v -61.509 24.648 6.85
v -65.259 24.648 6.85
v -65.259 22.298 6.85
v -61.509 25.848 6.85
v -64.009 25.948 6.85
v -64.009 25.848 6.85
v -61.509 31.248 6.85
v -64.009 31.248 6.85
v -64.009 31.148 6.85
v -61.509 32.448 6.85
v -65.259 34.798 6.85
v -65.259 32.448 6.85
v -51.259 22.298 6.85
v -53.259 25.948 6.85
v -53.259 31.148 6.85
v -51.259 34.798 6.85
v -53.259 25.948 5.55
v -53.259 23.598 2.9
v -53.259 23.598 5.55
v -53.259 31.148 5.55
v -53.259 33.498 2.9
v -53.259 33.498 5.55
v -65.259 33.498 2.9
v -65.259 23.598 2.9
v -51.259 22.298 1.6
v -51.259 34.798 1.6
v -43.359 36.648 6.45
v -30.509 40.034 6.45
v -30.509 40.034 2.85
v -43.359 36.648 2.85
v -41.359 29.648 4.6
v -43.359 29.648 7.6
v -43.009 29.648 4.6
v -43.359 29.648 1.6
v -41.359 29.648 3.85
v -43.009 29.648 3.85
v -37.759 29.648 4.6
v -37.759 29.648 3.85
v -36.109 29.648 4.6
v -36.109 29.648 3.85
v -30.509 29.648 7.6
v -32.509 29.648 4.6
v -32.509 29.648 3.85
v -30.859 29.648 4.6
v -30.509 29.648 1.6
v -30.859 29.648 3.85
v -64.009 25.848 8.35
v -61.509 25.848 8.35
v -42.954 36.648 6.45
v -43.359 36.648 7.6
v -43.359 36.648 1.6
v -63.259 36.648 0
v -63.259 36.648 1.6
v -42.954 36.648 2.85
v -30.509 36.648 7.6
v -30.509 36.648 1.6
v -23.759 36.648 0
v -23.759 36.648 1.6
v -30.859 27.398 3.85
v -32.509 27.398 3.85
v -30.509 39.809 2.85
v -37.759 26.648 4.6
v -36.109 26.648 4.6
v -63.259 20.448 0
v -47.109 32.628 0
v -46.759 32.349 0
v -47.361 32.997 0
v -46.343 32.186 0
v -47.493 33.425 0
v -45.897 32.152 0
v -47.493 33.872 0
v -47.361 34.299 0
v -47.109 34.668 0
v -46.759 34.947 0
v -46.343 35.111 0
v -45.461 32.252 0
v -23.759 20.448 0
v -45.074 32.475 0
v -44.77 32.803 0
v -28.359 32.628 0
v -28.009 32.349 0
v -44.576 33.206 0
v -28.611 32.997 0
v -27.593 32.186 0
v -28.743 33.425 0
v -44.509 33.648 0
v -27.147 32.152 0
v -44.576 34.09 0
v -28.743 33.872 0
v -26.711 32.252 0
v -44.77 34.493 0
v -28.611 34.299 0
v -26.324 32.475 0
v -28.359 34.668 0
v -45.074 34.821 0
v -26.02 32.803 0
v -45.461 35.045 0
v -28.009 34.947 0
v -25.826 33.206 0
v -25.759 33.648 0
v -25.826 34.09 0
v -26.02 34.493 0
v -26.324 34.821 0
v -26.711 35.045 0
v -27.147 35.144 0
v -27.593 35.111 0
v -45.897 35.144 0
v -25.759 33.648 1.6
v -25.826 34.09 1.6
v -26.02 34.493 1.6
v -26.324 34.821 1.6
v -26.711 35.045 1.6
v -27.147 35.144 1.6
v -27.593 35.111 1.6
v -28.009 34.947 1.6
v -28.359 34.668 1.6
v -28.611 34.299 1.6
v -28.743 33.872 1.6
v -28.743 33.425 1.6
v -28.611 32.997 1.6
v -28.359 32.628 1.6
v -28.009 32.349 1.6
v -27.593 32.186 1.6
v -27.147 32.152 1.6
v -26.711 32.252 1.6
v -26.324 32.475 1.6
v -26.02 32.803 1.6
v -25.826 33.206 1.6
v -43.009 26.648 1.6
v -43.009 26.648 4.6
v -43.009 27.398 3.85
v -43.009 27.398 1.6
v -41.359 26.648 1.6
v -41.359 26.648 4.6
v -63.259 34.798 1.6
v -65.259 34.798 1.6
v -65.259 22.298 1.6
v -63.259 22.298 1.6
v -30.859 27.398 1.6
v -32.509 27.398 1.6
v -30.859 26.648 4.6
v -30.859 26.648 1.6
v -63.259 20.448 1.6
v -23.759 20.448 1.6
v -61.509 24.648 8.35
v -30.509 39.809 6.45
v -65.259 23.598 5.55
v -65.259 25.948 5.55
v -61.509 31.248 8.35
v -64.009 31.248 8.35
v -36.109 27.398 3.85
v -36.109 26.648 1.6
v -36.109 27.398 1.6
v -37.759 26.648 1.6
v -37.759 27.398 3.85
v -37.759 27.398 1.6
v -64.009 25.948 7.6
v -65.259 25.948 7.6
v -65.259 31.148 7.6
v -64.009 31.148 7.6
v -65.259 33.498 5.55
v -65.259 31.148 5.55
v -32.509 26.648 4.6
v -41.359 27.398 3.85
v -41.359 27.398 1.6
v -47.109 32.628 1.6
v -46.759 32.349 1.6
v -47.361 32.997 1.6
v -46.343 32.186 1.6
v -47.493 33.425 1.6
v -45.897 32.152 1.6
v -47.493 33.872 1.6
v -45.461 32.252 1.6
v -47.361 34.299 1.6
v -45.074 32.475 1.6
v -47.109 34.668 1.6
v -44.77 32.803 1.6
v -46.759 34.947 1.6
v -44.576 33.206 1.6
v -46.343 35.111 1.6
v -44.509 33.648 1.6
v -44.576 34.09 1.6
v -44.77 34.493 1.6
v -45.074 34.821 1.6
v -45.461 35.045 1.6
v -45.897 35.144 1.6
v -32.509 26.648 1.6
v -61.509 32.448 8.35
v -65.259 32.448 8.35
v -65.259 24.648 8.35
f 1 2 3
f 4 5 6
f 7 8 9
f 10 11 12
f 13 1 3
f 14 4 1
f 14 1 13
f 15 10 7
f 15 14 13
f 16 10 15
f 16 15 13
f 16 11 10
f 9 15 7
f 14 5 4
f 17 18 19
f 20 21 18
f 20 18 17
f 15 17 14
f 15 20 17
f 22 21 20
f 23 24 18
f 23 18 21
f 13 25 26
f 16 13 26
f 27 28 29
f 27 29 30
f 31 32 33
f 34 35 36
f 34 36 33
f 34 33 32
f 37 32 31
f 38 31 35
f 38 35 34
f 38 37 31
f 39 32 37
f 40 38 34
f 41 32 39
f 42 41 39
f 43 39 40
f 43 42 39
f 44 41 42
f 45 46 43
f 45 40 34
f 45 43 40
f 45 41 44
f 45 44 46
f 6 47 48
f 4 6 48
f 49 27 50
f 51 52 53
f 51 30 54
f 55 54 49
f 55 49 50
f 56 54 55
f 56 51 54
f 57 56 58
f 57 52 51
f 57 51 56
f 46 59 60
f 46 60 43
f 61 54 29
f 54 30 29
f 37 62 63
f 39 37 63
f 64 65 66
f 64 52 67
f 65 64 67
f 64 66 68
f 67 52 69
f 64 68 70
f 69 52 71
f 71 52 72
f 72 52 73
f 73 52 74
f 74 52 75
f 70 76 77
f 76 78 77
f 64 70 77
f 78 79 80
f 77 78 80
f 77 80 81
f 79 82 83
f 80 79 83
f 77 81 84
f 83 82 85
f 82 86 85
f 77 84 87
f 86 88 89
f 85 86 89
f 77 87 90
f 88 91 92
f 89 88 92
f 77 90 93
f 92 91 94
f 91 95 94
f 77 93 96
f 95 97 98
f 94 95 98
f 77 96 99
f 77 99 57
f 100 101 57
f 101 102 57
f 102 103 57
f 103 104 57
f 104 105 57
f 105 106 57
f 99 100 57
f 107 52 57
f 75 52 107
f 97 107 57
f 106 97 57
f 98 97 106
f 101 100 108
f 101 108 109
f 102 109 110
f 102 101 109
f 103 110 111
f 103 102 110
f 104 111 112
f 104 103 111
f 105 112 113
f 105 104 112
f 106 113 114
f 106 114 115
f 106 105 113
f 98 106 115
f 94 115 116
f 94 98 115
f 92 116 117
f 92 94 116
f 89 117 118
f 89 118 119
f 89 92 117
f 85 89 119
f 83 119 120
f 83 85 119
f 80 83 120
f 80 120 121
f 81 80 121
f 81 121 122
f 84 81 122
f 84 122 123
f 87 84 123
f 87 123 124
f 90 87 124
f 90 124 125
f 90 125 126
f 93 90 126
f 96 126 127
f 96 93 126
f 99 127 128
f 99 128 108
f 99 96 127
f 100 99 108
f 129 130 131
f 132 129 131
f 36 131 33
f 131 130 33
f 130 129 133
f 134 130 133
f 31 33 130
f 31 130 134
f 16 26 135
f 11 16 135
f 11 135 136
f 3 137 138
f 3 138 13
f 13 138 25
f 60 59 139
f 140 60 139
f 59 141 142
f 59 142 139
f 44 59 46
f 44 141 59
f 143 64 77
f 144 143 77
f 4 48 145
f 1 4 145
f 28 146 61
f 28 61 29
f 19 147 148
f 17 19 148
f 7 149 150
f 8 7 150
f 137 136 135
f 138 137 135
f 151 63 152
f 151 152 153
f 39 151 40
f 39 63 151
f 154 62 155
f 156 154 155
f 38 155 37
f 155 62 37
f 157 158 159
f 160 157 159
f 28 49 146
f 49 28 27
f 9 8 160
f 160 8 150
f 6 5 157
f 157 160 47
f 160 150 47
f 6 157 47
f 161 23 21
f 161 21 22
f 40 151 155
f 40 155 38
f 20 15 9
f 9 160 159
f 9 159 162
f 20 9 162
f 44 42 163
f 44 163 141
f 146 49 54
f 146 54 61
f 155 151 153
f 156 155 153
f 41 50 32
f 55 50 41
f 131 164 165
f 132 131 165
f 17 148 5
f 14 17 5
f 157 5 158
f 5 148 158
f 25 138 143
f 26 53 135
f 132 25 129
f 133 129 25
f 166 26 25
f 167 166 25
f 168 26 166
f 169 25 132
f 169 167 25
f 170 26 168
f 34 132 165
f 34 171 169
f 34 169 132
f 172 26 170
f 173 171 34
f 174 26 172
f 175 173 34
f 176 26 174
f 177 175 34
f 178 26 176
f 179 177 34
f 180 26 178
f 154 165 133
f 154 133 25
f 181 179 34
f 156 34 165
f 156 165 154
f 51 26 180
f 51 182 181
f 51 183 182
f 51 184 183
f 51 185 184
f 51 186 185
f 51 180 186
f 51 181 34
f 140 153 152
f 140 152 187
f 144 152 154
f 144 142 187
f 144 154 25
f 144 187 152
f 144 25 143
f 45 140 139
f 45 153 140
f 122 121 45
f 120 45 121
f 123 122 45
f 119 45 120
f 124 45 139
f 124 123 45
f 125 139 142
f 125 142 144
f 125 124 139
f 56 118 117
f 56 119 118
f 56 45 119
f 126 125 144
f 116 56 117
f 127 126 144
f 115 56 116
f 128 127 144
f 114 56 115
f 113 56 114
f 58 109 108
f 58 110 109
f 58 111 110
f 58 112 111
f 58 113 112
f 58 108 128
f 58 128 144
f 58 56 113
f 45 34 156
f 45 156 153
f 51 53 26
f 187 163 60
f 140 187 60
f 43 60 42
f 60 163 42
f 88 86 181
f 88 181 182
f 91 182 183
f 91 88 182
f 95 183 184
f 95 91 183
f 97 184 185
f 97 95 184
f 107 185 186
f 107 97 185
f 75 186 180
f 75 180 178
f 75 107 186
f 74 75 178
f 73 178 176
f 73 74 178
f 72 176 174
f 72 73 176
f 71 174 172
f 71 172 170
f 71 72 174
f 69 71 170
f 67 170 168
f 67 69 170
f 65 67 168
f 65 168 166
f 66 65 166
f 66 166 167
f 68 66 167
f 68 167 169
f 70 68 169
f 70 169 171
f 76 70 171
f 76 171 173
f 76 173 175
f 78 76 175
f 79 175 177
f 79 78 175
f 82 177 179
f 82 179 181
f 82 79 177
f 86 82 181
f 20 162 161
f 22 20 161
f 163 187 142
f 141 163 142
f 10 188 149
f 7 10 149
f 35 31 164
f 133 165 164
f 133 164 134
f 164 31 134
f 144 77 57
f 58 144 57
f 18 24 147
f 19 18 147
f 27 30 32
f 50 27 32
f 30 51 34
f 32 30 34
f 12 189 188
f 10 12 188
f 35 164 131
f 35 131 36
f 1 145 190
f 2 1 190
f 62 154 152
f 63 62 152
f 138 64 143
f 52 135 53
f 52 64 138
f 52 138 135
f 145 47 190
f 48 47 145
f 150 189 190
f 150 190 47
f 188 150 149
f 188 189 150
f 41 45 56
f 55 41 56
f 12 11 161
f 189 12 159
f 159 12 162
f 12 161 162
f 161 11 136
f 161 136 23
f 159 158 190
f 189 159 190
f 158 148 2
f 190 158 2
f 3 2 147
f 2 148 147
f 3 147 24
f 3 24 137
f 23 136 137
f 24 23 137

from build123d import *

# Parameters (mm, degrees)
SKETCH1_W           = 39.5
SKETCH1_H           = 16.2
SKETCH1_R           = 1.5
BOSS_EXTRUDE1_DEPTH = 1.6
BOSS_EXTRUDE2_DEPTH = 6
SKETCH3_W           = 12.85
SKETCH3_H           = 3
CUT_EXTRUDE1_DEPTH  = 3
CUT_EXTRUDE3_DEPTH  = 3
SKETCH5_W           = 2.25
SKETCH5_H           = 2.25
CUT_EXTRUDE4_DEPTH  = 50.733422671
BOSS_EXTRUDE3_DEPTH = 6.75
CUT_EXTRUDE5_DEPTH  = 1.5
SKETCH8_W           = 2.65
SKETCH8_H           = 9.9
CUT_EXTRUDE6_DEPTH  = 12
CUT_EXTRUDE7_REACH  = 76.987
SKETCH9_W           = 0.35
SKETCH9_H           = 3
SKETCH9_W_2         = 0.175
BOSS_EXTRUDE4_DEPTH = 4.75
SKETCH11_W          = 12.85
SKETCH11_H          = 1.15
CUT_EXTRUDE8_DEPTH  = 4.75


with BuildPart() as part:
    # Sketch1 → Boss-Extrude1 (new body)
    with BuildSketch(Plane.XY):
        with Locations((-43.509331094, 28.548203647)):
            Rectangle(SKETCH1_W, SKETCH1_H)
        with Locations((-27.259331094, 33.648203647)):
            Circle(SKETCH1_R, mode=Mode.SUBTRACT)
        with Locations((-46.009331094, 33.648203647)):
            Circle(SKETCH1_R, mode=Mode.SUBTRACT)
    extrude(amount=BOSS_EXTRUDE1_DEPTH)

    # Sketch2 → Boss-Extrude2 (add)
    with BuildSketch(Plane.XY.offset(1.6)):
        Polygon((-30.509331094, 30.378901516), (-30.509331094, 36.648203647), (-43.359331094, 36.648203647), (-43.359331094, 26.648203647), (-30.509331094, 26.648203647), align=None)
    extrude(amount=BOSS_EXTRUDE2_DEPTH)

    # Sketch3 → Cut-Extrude1 (cut)
    with BuildSketch(Plane.XY.offset(7.6)):
        with Locations((-36.934331094, 28.148203647)):
            Rectangle(SKETCH3_W, SKETCH3_H)
    extrude(amount=-CUT_EXTRUDE1_DEPTH, mode=Mode.SUBTRACT)

    # Sketch4 → Cut-Extrude3 (cut)
    with BuildSketch(Plane.XY.offset(4.6)):
        Polygon((-32.509331094, 29.648203647), (-35.934331094, 29.648203647), (-35.934331094, 26.648203647), (-32.509331094, 26.648203647), (-32.509331094, 27.856511678), align=None)
        Polygon((-37.934331094, 29.648203647), (-41.359331094, 29.648203647), (-41.359331094, 28.148203647), (-41.359331094, 26.648203647), (-37.934331094, 26.648203647), align=None)
    extrude(amount=-CUT_EXTRUDE3_DEPTH, mode=Mode.SUBTRACT)

    # Sketch5 → Cut-Extrude4 (cut, through all)
    with BuildSketch(Plane(origin=(-30.509331094, 0, 0), x_dir=(0, 0, -1), z_dir=(1, 0, 0))):
        with Locations((-2.725, 28.523203647)):
            Rectangle(SKETCH5_W, SKETCH5_H)
    extrude(amount=-CUT_EXTRUDE4_DEPTH, mode=Mode.SUBTRACT)

    # Sketch6 → Boss-Extrude3 (add)
    with BuildSketch(Plane.XY.offset(1.6)):
        Polygon((-63.259331094, 22.298203647), (-63.259331094, 28.548203647), (-63.259331094, 34.798203647), (-65.259331094, 34.798203647), (-65.259331094, 22.298203647), align=None)
        Polygon((-63.259331094, 34.798203647), (-63.259331094, 28.548203647), (-63.259331094, 22.298203647), (-51.259331094, 22.298203647), (-51.259331094, 34.798203647), align=None)
    extrude(amount=BOSS_EXTRUDE3_DEPTH)

    # Sketch7 → Cut-Extrude5 (cut)
    with BuildSketch(Plane.XY.offset(8.35)):
        Polygon((-65.259331094, 34.798203647), (-65.259331094, 32.448203647), (-61.509331094, 32.448203647), (-61.509331094, 31.248203647), (-64.009331094, 31.248203647), (-64.009331094, 25.848203647), (-61.509331094, 25.848203647), (-61.509331094, 24.648203647), (-65.259331094, 24.648203647), (-65.259331094, 22.298203647), (-51.259331094, 22.298203647), (-51.259331094, 34.798203647), align=None)
    extrude(amount=-CUT_EXTRUDE5_DEPTH, mode=Mode.SUBTRACT)

    # Sketch8 → Cut-Extrude6 (cut)
    with BuildSketch(Plane.ZY.offset(65.259331094)):
        Polygon((6.85, 31.148203647), (5.55, 31.148203647), (5.55, 25.948203647), (6.85, 25.948203647), (7.6, 25.948203647), (7.6, 31.148203647), align=None)
        with Locations((4.225, 28.548203647)):
            Rectangle(SKETCH8_W, SKETCH8_H)
    extrude(amount=-CUT_EXTRUDE6_DEPTH, mode=Mode.SUBTRACT)

    # Cut-Extrude7: up to this face of the body (flat: up to its plane)
    cut_extrude7_end = Plane(part.part.faces().sort_by_distance((-39.983883979, 27.291998742, 1.6))[0])
    # Sketch9 → Cut-Extrude7 (cut, up to the picked face)
    with BuildSketch(Plane.XY.offset(4.6), mode=Mode.PRIVATE) as cut_extrude7_sk1:
        with Locations((-30.684331094, 28.148203647)):
            Rectangle(SKETCH9_W, SKETCH9_H)
    cut_extrude7_tool1 = split(extrude(cut_extrude7_sk1.sketch, amount=-CUT_EXTRUDE7_REACH, mode=Mode.PRIVATE), bisect_by=cut_extrude7_end, keep=Keep.BOTH, mode=Mode.PRIVATE)
    # Sketch9 → Cut-Extrude7 (cut, up to the picked face)
    with BuildSketch(Plane.XY.offset(4.6), mode=Mode.PRIVATE) as cut_extrude7_sk2:
        with Locations((-43.184331094, 28.148203647)):
            Rectangle(SKETCH9_W, SKETCH9_H)
    cut_extrude7_tool2 = split(extrude(cut_extrude7_sk2.sketch, amount=-CUT_EXTRUDE7_REACH, mode=Mode.PRIVATE), bisect_by=cut_extrude7_end, keep=Keep.BOTH, mode=Mode.PRIVATE)
    # Sketch9 → Cut-Extrude7 (cut, up to the picked face)
    with BuildSketch(Plane.XY.offset(4.6), mode=Mode.PRIVATE) as cut_extrude7_sk3:
        with Locations((-37.846831094, 28.148203647)):
            Rectangle(SKETCH9_W_2, SKETCH9_H)
    cut_extrude7_tool3 = split(extrude(cut_extrude7_sk3.sketch, amount=-CUT_EXTRUDE7_REACH, mode=Mode.PRIVATE), bisect_by=cut_extrude7_end, keep=Keep.BOTH, mode=Mode.PRIVATE)
    # Sketch9 → Cut-Extrude7 (cut, up to the picked face)
    with BuildSketch(Plane.XY.offset(4.6), mode=Mode.PRIVATE) as cut_extrude7_sk4:
        with Locations((-36.021831094, 28.148203647)):
            Rectangle(SKETCH9_W_2, SKETCH9_H)
    cut_extrude7_tool4 = split(extrude(cut_extrude7_sk4.sketch, amount=-CUT_EXTRUDE7_REACH, mode=Mode.PRIVATE), bisect_by=cut_extrude7_end, keep=Keep.BOTH, mode=Mode.PRIVATE)
    add(cut_extrude7_tool1.solids().sort_by(Axis((-30.684331, 28.148204, 4.6), (0, 0, -1)))[0], mode=Mode.SUBTRACT)
    add(cut_extrude7_tool2.solids().sort_by(Axis((-43.184331, 28.148204, 4.6), (0, 0, -1)))[0], mode=Mode.SUBTRACT)
    add(cut_extrude7_tool3.solids().sort_by(Axis((-37.846831, 28.148204, 4.6), (0, 0, -1)))[0], mode=Mode.SUBTRACT)
    add(cut_extrude7_tool4.solids().sort_by(Axis((-36.021831, 28.148204, 4.6), (0, 0, -1)))[0], mode=Mode.SUBTRACT)

    # Sketch10 → Boss-Extrude4 (add)
    with BuildSketch(Plane.XY.offset(7.6)):
        Polygon((-30.509331094, 40.033691869), (-43.359331094, 36.648203647), (-42.954120568, 36.648203647), (-30.509331094, 39.809326044), align=None)
    extrude(amount=-BOSS_EXTRUDE4_DEPTH)

    # Sketch11 → Cut-Extrude8 (cut)
    with BuildSketch(Plane(origin=(0, 36.648203647, 0), x_dir=(1, 0, 0), z_dir=(0, 1, 0))):
        with Locations((-36.934331094, -7.025)):
            Rectangle(SKETCH11_W, SKETCH11_H)
    extrude(amount=CUT_EXTRUDE8_DEPTH, mode=Mode.SUBTRACT)


solid = part.part
